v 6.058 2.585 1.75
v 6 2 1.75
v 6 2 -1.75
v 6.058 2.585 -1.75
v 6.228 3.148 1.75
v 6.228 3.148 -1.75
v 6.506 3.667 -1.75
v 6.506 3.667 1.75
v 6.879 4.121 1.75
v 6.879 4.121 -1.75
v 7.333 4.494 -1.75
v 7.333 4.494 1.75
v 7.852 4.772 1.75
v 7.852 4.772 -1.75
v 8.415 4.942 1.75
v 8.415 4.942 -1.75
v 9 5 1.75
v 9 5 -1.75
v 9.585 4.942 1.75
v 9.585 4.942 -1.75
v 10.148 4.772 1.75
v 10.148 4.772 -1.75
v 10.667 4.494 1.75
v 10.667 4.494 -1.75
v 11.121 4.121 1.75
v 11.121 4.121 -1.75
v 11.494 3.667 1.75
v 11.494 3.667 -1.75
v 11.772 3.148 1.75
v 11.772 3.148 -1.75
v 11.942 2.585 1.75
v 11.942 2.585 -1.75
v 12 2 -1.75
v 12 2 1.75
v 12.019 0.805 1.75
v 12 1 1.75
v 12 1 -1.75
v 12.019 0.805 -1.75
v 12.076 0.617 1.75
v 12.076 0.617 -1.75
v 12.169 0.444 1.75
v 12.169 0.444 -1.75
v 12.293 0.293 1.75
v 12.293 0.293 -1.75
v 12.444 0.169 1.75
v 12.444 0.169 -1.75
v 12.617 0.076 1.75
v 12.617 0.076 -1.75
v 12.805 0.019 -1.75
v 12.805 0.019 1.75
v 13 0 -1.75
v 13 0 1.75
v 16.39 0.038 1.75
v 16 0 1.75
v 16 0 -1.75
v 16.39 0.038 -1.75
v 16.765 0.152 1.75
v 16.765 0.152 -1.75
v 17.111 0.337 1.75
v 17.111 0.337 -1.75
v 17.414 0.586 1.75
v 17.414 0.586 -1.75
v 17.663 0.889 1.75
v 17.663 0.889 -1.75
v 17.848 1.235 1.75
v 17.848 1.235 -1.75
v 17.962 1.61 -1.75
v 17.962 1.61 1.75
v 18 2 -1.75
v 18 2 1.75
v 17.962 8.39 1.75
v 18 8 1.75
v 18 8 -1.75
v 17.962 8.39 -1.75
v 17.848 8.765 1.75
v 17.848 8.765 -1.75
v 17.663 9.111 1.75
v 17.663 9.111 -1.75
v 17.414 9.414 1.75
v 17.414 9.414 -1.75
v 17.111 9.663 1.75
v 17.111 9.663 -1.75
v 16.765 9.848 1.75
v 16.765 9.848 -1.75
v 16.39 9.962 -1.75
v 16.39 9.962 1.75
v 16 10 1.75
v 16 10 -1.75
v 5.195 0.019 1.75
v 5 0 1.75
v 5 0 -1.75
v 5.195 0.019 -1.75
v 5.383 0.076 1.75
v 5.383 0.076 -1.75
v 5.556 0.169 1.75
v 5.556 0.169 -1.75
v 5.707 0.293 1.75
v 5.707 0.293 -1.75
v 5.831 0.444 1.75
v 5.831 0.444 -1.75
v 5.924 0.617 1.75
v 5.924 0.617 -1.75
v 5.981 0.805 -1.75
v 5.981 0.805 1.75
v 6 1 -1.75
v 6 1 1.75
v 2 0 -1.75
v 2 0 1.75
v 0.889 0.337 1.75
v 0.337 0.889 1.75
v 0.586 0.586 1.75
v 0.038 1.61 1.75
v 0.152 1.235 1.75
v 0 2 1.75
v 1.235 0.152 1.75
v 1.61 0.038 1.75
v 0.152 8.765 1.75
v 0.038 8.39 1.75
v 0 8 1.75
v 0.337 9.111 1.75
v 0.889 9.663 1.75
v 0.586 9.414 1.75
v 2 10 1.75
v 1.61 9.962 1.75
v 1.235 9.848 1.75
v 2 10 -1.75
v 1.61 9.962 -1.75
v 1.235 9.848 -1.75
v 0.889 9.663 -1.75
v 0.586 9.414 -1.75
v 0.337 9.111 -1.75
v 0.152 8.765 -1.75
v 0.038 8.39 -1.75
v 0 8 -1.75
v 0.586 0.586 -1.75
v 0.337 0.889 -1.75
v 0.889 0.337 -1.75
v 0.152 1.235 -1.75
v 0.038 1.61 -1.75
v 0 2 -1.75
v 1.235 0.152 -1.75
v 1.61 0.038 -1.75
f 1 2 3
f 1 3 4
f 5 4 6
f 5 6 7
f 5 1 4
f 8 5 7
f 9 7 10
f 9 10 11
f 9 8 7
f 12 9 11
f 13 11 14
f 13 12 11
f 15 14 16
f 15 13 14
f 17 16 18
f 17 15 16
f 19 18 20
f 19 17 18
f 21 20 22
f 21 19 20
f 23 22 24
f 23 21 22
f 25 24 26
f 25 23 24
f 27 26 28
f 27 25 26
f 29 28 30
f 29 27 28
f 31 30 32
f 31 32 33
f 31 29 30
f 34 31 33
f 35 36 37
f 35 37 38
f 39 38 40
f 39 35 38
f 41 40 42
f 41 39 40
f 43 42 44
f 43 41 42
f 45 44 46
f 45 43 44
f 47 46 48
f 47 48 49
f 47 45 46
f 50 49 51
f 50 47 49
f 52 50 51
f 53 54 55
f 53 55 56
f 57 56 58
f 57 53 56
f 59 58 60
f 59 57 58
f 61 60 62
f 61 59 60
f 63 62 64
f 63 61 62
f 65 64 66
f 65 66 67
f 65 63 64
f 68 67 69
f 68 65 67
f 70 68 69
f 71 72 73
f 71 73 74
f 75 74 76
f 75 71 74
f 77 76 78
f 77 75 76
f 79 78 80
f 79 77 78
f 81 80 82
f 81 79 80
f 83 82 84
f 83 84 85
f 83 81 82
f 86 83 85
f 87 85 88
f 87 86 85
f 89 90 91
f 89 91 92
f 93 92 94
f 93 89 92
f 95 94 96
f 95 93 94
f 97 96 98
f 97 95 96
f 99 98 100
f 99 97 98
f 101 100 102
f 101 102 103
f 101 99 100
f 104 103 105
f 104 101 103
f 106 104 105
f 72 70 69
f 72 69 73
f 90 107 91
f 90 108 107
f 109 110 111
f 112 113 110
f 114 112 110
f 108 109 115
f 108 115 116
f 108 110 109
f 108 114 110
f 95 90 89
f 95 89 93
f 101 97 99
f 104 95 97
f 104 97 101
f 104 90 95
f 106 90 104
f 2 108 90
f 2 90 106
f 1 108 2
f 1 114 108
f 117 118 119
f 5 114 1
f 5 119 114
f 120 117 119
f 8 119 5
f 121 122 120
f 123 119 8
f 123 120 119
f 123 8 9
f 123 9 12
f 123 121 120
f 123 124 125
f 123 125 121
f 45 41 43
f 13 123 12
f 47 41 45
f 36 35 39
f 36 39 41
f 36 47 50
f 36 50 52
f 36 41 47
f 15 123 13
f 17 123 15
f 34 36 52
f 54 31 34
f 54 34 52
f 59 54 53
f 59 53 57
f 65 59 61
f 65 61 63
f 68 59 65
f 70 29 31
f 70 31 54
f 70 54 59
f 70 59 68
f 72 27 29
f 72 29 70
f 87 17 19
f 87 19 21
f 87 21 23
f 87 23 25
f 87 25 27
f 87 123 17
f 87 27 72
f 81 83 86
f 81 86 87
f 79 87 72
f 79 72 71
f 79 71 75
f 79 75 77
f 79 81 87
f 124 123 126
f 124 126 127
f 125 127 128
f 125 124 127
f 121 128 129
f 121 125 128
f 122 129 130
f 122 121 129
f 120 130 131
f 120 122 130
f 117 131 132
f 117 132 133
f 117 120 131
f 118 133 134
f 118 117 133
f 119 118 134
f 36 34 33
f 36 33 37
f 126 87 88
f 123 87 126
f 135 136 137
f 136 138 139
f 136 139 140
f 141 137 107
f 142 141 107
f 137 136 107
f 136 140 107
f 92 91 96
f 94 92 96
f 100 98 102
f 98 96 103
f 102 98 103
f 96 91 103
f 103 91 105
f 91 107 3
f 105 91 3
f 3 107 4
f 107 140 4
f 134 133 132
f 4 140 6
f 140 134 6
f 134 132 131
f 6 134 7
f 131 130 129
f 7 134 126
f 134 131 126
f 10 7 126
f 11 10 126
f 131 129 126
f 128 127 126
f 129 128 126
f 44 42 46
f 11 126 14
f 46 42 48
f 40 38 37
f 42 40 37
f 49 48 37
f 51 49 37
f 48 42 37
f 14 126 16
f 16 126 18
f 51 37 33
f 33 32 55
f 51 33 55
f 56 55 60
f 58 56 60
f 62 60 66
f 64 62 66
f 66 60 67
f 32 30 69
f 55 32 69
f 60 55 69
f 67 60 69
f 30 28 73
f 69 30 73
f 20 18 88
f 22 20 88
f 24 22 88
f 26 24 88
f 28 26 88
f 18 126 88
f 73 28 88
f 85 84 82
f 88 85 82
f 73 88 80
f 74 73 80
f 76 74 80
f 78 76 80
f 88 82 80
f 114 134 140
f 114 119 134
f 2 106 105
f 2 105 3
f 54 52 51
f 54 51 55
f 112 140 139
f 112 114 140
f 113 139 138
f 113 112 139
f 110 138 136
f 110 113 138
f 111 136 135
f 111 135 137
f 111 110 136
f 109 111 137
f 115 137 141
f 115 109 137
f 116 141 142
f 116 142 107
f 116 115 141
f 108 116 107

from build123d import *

# Parameters (mm, degrees)
BOSS_EXTRUDE1_DEPTH = 1.75


with BuildPart() as part:
    # Sketch1 → Boss-Extrude1 (new body, symmetric)
    with BuildSketch(Plane.XY):
        with BuildLine():
            Line((2, 0), (5, 0))
            ThreePointArc((5, 0), (5.707106781, 0.292893219), (6, 1))
            Line((6, 1), (6, 2))
            ThreePointArc((6, 2), (9, 5), (12, 2))
            Line((12, 2), (12, 1))
            ThreePointArc((12, 1), (12.292893219, 0.292893219), (13, 0))
            Line((13, 0), (16, 0))
            ThreePointArc((16, 0), (17.414213562, 0.585786438), (18, 2))
            Line((18, 2), (18, 8))
            ThreePointArc((18, 8), (17.414213562, 9.414213562), (16, 10))
            Line((16, 10), (2, 10))
            ThreePointArc((2, 10), (0.585786438, 9.414213562), (0, 8))
            Line((0, 8), (0, 2))
            ThreePointArc((0, 2), (0.585786438, 0.585786438), (2, 0))
        make_face()
    extrude(amount=BOSS_EXTRUDE1_DEPTH, both=True)


solid = part.part
